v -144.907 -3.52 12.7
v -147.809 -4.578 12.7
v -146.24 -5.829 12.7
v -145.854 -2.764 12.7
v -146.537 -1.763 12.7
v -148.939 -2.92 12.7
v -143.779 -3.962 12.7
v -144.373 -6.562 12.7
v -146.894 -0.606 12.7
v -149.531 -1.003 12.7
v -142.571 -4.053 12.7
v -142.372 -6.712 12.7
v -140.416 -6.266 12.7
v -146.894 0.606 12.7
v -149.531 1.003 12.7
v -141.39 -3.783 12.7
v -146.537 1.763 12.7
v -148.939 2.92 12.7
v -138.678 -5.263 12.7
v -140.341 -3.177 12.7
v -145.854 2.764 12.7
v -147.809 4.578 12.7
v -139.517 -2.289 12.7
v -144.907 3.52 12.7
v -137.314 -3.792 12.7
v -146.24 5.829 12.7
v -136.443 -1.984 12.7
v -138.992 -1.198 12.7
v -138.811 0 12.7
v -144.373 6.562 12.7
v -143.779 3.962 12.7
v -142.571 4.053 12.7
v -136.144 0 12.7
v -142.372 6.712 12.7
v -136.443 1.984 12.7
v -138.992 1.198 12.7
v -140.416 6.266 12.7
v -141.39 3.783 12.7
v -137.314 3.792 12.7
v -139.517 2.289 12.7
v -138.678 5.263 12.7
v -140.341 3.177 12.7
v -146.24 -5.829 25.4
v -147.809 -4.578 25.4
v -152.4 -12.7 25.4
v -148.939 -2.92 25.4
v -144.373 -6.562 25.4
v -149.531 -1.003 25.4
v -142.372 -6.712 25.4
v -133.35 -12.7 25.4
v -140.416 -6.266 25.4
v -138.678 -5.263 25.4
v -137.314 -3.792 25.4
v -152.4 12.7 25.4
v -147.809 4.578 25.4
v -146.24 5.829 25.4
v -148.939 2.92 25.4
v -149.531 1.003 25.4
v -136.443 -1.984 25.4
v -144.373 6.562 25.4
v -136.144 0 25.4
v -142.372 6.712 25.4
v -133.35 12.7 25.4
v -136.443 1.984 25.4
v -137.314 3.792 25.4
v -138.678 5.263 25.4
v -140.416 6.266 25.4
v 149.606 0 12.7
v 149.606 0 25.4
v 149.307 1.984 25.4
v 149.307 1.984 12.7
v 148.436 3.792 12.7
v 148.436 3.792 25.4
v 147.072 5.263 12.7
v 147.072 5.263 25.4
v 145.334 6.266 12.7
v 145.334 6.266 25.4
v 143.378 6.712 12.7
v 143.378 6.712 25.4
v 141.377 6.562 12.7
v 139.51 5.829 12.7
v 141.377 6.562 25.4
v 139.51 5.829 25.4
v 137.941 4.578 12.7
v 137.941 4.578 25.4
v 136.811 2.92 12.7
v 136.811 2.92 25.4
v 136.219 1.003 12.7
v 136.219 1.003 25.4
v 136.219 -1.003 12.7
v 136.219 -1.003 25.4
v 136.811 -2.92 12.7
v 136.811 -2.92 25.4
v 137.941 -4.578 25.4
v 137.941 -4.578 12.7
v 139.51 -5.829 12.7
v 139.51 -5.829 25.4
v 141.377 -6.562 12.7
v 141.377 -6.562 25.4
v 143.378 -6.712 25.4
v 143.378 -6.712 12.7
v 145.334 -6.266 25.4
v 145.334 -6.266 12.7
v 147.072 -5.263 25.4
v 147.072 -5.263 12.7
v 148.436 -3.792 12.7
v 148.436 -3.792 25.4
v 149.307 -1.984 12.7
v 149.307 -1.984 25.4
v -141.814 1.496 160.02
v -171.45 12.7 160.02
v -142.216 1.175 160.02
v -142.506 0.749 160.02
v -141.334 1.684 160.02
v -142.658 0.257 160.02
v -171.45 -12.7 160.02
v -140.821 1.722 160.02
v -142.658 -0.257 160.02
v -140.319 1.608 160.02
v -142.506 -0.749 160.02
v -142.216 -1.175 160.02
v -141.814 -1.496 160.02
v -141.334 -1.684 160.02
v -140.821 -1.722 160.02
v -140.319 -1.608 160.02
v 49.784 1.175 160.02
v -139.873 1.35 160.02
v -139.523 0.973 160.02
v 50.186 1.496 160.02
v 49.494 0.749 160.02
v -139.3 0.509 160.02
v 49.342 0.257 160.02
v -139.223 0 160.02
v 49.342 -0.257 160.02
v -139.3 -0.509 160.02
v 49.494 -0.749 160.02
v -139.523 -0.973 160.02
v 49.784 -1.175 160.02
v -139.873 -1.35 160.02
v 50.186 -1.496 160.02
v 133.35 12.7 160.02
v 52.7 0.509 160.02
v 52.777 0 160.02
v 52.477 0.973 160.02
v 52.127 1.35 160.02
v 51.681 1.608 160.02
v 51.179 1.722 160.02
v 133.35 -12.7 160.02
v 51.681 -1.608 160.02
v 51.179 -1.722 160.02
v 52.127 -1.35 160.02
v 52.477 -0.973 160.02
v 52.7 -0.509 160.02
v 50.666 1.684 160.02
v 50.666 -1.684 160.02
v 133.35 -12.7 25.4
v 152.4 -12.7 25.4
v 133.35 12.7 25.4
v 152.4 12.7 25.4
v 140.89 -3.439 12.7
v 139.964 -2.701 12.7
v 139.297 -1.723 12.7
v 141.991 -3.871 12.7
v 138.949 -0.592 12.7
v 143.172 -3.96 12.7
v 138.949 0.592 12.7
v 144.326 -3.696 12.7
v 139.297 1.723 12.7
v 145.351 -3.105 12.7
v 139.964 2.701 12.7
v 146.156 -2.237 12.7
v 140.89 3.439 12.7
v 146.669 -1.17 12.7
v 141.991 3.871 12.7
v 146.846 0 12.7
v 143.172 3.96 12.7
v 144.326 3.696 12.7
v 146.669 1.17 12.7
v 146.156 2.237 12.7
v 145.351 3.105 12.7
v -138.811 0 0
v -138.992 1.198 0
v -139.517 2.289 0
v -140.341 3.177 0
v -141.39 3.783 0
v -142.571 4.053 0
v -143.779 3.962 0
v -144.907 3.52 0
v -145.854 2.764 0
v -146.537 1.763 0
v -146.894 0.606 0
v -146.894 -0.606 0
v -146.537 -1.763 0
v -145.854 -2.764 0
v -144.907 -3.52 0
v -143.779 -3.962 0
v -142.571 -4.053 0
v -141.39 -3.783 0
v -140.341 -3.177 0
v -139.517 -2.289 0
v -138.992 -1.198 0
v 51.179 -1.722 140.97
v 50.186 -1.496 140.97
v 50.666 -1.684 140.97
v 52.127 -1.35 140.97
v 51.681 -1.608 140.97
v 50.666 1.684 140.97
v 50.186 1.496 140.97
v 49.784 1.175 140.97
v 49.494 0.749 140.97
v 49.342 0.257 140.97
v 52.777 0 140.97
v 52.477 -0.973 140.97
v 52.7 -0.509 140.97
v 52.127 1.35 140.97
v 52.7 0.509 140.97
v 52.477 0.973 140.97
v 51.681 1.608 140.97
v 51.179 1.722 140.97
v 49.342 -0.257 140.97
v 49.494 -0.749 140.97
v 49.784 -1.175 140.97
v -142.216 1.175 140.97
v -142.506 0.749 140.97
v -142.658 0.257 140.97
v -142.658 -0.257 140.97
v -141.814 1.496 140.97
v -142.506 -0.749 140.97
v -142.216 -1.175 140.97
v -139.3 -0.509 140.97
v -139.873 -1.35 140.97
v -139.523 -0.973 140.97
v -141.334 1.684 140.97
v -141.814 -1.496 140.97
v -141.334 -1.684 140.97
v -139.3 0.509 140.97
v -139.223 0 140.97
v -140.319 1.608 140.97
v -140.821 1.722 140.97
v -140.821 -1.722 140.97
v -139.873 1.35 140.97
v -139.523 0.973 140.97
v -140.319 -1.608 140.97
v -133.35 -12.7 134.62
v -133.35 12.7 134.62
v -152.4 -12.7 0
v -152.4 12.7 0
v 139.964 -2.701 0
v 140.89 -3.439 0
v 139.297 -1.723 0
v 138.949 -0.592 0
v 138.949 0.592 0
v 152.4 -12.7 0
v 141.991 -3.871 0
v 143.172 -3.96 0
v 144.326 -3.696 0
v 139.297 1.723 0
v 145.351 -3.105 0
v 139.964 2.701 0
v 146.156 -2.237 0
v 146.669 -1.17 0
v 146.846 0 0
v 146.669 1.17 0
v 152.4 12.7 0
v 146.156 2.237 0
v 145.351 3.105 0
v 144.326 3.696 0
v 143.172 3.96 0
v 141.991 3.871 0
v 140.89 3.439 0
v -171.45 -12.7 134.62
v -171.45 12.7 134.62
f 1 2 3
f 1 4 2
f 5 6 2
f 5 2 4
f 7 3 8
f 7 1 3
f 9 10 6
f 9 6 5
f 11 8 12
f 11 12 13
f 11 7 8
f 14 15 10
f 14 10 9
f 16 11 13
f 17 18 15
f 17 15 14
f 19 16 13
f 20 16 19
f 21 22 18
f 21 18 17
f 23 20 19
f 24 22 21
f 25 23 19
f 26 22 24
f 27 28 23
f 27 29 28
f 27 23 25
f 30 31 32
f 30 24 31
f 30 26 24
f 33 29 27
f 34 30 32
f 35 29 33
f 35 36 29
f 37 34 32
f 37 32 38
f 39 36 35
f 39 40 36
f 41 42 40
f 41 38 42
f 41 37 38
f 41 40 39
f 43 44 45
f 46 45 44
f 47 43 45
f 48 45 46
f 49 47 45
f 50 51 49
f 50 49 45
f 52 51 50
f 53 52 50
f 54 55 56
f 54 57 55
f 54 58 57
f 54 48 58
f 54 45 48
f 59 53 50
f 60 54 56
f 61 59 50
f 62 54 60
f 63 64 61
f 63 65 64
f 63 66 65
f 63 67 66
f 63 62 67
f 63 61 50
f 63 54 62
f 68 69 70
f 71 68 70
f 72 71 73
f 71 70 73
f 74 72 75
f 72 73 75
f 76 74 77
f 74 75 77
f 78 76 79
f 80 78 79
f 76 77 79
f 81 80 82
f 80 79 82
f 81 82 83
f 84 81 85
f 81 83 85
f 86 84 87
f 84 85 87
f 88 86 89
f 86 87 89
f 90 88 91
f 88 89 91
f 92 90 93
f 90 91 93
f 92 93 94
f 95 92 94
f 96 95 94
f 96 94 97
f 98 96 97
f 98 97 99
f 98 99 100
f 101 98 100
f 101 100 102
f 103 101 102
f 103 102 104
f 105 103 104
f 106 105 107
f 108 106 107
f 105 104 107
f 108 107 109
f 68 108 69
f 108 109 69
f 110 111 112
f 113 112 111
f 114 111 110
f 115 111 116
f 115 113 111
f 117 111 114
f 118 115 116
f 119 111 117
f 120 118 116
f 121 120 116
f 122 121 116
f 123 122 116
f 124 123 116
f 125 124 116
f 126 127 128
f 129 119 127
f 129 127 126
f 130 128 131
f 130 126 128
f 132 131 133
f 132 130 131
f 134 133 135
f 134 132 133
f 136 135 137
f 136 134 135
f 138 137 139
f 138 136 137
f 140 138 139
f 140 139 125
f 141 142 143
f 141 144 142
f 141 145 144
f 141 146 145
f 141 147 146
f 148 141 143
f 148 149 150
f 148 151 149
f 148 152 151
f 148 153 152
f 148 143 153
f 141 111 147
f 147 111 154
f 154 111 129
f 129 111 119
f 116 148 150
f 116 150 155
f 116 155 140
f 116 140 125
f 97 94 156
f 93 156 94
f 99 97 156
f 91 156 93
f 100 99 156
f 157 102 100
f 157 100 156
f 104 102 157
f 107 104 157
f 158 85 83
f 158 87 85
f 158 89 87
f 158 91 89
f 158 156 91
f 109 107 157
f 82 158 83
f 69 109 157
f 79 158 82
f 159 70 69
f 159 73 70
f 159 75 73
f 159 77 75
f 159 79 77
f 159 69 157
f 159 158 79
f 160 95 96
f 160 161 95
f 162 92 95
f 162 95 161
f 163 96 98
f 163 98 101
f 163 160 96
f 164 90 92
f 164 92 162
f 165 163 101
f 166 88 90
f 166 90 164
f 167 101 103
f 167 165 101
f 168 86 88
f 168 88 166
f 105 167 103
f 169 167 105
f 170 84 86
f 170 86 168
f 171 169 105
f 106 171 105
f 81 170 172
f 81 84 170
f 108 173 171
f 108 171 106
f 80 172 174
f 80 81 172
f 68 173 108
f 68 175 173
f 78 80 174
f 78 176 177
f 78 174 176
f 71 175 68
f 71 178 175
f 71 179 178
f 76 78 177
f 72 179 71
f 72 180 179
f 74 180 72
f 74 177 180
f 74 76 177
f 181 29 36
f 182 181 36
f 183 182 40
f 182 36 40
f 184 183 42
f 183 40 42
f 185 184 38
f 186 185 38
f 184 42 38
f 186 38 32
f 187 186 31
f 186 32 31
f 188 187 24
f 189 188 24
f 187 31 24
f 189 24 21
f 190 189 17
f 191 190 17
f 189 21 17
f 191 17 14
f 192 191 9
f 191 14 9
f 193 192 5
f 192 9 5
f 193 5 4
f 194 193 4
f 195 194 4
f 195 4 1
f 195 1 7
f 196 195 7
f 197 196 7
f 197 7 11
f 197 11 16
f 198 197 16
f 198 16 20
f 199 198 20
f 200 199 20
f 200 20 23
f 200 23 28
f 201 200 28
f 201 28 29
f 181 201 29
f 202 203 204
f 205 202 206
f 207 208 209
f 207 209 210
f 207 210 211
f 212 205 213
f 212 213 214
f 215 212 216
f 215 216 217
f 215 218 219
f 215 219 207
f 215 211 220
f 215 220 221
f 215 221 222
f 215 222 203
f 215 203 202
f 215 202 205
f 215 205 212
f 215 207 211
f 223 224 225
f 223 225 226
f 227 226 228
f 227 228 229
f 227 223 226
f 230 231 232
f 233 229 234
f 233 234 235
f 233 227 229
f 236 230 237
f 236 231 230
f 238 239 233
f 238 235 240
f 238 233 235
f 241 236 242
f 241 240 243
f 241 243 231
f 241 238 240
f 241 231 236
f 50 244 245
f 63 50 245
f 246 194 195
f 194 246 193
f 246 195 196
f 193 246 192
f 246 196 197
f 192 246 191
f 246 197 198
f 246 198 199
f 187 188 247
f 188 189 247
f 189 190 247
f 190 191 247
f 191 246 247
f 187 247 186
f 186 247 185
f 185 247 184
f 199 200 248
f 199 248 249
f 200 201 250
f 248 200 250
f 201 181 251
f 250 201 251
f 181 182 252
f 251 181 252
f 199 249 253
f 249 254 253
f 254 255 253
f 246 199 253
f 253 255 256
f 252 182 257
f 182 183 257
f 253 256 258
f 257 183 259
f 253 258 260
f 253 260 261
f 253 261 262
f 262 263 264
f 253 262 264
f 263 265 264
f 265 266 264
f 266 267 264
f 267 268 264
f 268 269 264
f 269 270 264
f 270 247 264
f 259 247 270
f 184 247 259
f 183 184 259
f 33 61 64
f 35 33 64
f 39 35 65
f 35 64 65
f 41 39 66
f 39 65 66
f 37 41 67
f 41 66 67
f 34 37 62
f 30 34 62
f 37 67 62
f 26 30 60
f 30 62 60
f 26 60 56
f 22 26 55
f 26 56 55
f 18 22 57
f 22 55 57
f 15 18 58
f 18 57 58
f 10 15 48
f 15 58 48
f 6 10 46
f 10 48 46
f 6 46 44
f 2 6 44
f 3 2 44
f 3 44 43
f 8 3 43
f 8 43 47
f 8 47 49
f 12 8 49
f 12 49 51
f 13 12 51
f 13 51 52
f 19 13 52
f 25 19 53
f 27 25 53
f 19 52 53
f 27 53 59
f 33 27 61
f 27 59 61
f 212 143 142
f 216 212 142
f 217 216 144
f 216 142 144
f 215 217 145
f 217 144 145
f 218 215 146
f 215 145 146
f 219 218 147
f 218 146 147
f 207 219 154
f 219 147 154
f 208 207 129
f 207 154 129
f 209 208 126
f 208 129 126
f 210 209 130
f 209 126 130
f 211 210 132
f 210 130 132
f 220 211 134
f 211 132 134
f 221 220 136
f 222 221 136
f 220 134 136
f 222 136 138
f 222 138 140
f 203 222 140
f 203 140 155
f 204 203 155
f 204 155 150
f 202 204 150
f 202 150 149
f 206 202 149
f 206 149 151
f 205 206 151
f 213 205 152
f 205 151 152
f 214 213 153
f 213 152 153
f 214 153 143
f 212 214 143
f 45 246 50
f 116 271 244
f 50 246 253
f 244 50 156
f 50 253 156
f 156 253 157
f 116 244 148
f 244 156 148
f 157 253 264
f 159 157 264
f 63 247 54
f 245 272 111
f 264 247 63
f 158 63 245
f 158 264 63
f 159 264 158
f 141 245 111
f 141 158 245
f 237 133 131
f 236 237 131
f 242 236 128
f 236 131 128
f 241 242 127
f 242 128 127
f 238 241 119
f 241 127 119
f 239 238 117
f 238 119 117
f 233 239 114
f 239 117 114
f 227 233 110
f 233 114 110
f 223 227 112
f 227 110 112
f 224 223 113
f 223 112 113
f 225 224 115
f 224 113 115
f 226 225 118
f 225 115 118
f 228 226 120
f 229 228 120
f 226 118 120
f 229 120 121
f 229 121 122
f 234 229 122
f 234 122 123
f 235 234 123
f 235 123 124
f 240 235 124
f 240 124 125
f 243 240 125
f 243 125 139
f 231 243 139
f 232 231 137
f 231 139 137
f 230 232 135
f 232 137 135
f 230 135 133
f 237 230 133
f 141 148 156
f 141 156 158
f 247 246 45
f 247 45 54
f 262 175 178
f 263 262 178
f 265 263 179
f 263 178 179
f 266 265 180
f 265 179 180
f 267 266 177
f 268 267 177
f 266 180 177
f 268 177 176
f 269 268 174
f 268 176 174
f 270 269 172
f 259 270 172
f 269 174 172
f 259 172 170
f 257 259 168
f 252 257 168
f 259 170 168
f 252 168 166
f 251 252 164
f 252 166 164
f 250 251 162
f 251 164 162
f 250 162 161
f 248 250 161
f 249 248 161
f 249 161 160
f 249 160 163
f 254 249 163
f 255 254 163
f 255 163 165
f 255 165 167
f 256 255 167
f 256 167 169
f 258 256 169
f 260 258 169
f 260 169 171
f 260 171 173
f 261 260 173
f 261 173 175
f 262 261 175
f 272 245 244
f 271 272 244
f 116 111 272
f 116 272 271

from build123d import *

# Parameters (mm, degrees)
F0_W      = 304.8
F0_H      = 25.4
F1_DEPTH  = 160.02
F2_W      = 19.05
F2_H      = 25.4
F3_DEPTH  = 134.62
F4_R      = 3.970807
F4_R_2    = 4.064
F5_DEPTH  = 25.401
F4_R_3    = 6.731
F6_DEPTH  = 12.7
F7_W      = 25.4
F7_H      = 25.4
F8_DEPTH  = 38.1
F9_R      = 1.7272
F10_DEPTH = 19.05


with BuildPart() as f1:
    # F0 (on Top) → F1 (new body)
    with BuildSketch(Plane.XY):
        Rectangle(F0_W, F0_H)
    extrude(amount=F1_DEPTH)

    # F2 (on face) → F3 (cut)
    with BuildSketch(Plane.XY.offset(160.02)):
        with Locations((-142.875, 0)):
            Rectangle(F2_W, F2_H)
        with Locations((142.875, 0)):
            Rectangle(F2_W, F2_H)
    extrude(amount=-F3_DEPTH, mode=Mode.SUBTRACT)

    # F4 (on face) → F5 (cut, through all)
    with BuildSketch(Plane.XY.offset(25.4)):
        with Locations((142.875, 0)):
            Circle(F4_R)
        with Locations((-142.875, 0)):
            Circle(F4_R_2)
    extrude(amount=-F5_DEPTH, mode=Mode.SUBTRACT)

    # F4 (on face) → F6 (cut)
    with BuildSketch(Plane.XY.offset(25.4)):
        with Locations((-142.875, 0)):
            Circle(F4_R_3)
        with Locations((-142.875, 0)):
            Circle(F4_R_2, mode=Mode.SUBTRACT)
        with Locations((142.875, 0)):
            Circle(F4_R_3)
        with Locations((142.875, 0)):
            Circle(F4_R, mode=Mode.SUBTRACT)
    extrude(amount=-F6_DEPTH, mode=Mode.SUBTRACT)

    # F7 (on face) → F8 (join)
    with BuildSketch(Plane(origin=(-133.35, 0, 0), x_dir=(0, -1, 0), z_dir=(-1, 0, 0))):
        with Locations((0, 147.32)):
            Rectangle(F7_W, F7_H)
    extrude(amount=F8_DEPTH)

    # F9 (on face) → F10 (cut)
    with BuildSketch(Plane.XY.offset(160.02)):
        with Locations((-140.95, 0)):
            Circle(F9_R)
        with Locations((51.05, 0)):
            Circle(F9_R)
    extrude(amount=-F10_DEPTH, mode=Mode.SUBTRACT)


solid = f1.part
